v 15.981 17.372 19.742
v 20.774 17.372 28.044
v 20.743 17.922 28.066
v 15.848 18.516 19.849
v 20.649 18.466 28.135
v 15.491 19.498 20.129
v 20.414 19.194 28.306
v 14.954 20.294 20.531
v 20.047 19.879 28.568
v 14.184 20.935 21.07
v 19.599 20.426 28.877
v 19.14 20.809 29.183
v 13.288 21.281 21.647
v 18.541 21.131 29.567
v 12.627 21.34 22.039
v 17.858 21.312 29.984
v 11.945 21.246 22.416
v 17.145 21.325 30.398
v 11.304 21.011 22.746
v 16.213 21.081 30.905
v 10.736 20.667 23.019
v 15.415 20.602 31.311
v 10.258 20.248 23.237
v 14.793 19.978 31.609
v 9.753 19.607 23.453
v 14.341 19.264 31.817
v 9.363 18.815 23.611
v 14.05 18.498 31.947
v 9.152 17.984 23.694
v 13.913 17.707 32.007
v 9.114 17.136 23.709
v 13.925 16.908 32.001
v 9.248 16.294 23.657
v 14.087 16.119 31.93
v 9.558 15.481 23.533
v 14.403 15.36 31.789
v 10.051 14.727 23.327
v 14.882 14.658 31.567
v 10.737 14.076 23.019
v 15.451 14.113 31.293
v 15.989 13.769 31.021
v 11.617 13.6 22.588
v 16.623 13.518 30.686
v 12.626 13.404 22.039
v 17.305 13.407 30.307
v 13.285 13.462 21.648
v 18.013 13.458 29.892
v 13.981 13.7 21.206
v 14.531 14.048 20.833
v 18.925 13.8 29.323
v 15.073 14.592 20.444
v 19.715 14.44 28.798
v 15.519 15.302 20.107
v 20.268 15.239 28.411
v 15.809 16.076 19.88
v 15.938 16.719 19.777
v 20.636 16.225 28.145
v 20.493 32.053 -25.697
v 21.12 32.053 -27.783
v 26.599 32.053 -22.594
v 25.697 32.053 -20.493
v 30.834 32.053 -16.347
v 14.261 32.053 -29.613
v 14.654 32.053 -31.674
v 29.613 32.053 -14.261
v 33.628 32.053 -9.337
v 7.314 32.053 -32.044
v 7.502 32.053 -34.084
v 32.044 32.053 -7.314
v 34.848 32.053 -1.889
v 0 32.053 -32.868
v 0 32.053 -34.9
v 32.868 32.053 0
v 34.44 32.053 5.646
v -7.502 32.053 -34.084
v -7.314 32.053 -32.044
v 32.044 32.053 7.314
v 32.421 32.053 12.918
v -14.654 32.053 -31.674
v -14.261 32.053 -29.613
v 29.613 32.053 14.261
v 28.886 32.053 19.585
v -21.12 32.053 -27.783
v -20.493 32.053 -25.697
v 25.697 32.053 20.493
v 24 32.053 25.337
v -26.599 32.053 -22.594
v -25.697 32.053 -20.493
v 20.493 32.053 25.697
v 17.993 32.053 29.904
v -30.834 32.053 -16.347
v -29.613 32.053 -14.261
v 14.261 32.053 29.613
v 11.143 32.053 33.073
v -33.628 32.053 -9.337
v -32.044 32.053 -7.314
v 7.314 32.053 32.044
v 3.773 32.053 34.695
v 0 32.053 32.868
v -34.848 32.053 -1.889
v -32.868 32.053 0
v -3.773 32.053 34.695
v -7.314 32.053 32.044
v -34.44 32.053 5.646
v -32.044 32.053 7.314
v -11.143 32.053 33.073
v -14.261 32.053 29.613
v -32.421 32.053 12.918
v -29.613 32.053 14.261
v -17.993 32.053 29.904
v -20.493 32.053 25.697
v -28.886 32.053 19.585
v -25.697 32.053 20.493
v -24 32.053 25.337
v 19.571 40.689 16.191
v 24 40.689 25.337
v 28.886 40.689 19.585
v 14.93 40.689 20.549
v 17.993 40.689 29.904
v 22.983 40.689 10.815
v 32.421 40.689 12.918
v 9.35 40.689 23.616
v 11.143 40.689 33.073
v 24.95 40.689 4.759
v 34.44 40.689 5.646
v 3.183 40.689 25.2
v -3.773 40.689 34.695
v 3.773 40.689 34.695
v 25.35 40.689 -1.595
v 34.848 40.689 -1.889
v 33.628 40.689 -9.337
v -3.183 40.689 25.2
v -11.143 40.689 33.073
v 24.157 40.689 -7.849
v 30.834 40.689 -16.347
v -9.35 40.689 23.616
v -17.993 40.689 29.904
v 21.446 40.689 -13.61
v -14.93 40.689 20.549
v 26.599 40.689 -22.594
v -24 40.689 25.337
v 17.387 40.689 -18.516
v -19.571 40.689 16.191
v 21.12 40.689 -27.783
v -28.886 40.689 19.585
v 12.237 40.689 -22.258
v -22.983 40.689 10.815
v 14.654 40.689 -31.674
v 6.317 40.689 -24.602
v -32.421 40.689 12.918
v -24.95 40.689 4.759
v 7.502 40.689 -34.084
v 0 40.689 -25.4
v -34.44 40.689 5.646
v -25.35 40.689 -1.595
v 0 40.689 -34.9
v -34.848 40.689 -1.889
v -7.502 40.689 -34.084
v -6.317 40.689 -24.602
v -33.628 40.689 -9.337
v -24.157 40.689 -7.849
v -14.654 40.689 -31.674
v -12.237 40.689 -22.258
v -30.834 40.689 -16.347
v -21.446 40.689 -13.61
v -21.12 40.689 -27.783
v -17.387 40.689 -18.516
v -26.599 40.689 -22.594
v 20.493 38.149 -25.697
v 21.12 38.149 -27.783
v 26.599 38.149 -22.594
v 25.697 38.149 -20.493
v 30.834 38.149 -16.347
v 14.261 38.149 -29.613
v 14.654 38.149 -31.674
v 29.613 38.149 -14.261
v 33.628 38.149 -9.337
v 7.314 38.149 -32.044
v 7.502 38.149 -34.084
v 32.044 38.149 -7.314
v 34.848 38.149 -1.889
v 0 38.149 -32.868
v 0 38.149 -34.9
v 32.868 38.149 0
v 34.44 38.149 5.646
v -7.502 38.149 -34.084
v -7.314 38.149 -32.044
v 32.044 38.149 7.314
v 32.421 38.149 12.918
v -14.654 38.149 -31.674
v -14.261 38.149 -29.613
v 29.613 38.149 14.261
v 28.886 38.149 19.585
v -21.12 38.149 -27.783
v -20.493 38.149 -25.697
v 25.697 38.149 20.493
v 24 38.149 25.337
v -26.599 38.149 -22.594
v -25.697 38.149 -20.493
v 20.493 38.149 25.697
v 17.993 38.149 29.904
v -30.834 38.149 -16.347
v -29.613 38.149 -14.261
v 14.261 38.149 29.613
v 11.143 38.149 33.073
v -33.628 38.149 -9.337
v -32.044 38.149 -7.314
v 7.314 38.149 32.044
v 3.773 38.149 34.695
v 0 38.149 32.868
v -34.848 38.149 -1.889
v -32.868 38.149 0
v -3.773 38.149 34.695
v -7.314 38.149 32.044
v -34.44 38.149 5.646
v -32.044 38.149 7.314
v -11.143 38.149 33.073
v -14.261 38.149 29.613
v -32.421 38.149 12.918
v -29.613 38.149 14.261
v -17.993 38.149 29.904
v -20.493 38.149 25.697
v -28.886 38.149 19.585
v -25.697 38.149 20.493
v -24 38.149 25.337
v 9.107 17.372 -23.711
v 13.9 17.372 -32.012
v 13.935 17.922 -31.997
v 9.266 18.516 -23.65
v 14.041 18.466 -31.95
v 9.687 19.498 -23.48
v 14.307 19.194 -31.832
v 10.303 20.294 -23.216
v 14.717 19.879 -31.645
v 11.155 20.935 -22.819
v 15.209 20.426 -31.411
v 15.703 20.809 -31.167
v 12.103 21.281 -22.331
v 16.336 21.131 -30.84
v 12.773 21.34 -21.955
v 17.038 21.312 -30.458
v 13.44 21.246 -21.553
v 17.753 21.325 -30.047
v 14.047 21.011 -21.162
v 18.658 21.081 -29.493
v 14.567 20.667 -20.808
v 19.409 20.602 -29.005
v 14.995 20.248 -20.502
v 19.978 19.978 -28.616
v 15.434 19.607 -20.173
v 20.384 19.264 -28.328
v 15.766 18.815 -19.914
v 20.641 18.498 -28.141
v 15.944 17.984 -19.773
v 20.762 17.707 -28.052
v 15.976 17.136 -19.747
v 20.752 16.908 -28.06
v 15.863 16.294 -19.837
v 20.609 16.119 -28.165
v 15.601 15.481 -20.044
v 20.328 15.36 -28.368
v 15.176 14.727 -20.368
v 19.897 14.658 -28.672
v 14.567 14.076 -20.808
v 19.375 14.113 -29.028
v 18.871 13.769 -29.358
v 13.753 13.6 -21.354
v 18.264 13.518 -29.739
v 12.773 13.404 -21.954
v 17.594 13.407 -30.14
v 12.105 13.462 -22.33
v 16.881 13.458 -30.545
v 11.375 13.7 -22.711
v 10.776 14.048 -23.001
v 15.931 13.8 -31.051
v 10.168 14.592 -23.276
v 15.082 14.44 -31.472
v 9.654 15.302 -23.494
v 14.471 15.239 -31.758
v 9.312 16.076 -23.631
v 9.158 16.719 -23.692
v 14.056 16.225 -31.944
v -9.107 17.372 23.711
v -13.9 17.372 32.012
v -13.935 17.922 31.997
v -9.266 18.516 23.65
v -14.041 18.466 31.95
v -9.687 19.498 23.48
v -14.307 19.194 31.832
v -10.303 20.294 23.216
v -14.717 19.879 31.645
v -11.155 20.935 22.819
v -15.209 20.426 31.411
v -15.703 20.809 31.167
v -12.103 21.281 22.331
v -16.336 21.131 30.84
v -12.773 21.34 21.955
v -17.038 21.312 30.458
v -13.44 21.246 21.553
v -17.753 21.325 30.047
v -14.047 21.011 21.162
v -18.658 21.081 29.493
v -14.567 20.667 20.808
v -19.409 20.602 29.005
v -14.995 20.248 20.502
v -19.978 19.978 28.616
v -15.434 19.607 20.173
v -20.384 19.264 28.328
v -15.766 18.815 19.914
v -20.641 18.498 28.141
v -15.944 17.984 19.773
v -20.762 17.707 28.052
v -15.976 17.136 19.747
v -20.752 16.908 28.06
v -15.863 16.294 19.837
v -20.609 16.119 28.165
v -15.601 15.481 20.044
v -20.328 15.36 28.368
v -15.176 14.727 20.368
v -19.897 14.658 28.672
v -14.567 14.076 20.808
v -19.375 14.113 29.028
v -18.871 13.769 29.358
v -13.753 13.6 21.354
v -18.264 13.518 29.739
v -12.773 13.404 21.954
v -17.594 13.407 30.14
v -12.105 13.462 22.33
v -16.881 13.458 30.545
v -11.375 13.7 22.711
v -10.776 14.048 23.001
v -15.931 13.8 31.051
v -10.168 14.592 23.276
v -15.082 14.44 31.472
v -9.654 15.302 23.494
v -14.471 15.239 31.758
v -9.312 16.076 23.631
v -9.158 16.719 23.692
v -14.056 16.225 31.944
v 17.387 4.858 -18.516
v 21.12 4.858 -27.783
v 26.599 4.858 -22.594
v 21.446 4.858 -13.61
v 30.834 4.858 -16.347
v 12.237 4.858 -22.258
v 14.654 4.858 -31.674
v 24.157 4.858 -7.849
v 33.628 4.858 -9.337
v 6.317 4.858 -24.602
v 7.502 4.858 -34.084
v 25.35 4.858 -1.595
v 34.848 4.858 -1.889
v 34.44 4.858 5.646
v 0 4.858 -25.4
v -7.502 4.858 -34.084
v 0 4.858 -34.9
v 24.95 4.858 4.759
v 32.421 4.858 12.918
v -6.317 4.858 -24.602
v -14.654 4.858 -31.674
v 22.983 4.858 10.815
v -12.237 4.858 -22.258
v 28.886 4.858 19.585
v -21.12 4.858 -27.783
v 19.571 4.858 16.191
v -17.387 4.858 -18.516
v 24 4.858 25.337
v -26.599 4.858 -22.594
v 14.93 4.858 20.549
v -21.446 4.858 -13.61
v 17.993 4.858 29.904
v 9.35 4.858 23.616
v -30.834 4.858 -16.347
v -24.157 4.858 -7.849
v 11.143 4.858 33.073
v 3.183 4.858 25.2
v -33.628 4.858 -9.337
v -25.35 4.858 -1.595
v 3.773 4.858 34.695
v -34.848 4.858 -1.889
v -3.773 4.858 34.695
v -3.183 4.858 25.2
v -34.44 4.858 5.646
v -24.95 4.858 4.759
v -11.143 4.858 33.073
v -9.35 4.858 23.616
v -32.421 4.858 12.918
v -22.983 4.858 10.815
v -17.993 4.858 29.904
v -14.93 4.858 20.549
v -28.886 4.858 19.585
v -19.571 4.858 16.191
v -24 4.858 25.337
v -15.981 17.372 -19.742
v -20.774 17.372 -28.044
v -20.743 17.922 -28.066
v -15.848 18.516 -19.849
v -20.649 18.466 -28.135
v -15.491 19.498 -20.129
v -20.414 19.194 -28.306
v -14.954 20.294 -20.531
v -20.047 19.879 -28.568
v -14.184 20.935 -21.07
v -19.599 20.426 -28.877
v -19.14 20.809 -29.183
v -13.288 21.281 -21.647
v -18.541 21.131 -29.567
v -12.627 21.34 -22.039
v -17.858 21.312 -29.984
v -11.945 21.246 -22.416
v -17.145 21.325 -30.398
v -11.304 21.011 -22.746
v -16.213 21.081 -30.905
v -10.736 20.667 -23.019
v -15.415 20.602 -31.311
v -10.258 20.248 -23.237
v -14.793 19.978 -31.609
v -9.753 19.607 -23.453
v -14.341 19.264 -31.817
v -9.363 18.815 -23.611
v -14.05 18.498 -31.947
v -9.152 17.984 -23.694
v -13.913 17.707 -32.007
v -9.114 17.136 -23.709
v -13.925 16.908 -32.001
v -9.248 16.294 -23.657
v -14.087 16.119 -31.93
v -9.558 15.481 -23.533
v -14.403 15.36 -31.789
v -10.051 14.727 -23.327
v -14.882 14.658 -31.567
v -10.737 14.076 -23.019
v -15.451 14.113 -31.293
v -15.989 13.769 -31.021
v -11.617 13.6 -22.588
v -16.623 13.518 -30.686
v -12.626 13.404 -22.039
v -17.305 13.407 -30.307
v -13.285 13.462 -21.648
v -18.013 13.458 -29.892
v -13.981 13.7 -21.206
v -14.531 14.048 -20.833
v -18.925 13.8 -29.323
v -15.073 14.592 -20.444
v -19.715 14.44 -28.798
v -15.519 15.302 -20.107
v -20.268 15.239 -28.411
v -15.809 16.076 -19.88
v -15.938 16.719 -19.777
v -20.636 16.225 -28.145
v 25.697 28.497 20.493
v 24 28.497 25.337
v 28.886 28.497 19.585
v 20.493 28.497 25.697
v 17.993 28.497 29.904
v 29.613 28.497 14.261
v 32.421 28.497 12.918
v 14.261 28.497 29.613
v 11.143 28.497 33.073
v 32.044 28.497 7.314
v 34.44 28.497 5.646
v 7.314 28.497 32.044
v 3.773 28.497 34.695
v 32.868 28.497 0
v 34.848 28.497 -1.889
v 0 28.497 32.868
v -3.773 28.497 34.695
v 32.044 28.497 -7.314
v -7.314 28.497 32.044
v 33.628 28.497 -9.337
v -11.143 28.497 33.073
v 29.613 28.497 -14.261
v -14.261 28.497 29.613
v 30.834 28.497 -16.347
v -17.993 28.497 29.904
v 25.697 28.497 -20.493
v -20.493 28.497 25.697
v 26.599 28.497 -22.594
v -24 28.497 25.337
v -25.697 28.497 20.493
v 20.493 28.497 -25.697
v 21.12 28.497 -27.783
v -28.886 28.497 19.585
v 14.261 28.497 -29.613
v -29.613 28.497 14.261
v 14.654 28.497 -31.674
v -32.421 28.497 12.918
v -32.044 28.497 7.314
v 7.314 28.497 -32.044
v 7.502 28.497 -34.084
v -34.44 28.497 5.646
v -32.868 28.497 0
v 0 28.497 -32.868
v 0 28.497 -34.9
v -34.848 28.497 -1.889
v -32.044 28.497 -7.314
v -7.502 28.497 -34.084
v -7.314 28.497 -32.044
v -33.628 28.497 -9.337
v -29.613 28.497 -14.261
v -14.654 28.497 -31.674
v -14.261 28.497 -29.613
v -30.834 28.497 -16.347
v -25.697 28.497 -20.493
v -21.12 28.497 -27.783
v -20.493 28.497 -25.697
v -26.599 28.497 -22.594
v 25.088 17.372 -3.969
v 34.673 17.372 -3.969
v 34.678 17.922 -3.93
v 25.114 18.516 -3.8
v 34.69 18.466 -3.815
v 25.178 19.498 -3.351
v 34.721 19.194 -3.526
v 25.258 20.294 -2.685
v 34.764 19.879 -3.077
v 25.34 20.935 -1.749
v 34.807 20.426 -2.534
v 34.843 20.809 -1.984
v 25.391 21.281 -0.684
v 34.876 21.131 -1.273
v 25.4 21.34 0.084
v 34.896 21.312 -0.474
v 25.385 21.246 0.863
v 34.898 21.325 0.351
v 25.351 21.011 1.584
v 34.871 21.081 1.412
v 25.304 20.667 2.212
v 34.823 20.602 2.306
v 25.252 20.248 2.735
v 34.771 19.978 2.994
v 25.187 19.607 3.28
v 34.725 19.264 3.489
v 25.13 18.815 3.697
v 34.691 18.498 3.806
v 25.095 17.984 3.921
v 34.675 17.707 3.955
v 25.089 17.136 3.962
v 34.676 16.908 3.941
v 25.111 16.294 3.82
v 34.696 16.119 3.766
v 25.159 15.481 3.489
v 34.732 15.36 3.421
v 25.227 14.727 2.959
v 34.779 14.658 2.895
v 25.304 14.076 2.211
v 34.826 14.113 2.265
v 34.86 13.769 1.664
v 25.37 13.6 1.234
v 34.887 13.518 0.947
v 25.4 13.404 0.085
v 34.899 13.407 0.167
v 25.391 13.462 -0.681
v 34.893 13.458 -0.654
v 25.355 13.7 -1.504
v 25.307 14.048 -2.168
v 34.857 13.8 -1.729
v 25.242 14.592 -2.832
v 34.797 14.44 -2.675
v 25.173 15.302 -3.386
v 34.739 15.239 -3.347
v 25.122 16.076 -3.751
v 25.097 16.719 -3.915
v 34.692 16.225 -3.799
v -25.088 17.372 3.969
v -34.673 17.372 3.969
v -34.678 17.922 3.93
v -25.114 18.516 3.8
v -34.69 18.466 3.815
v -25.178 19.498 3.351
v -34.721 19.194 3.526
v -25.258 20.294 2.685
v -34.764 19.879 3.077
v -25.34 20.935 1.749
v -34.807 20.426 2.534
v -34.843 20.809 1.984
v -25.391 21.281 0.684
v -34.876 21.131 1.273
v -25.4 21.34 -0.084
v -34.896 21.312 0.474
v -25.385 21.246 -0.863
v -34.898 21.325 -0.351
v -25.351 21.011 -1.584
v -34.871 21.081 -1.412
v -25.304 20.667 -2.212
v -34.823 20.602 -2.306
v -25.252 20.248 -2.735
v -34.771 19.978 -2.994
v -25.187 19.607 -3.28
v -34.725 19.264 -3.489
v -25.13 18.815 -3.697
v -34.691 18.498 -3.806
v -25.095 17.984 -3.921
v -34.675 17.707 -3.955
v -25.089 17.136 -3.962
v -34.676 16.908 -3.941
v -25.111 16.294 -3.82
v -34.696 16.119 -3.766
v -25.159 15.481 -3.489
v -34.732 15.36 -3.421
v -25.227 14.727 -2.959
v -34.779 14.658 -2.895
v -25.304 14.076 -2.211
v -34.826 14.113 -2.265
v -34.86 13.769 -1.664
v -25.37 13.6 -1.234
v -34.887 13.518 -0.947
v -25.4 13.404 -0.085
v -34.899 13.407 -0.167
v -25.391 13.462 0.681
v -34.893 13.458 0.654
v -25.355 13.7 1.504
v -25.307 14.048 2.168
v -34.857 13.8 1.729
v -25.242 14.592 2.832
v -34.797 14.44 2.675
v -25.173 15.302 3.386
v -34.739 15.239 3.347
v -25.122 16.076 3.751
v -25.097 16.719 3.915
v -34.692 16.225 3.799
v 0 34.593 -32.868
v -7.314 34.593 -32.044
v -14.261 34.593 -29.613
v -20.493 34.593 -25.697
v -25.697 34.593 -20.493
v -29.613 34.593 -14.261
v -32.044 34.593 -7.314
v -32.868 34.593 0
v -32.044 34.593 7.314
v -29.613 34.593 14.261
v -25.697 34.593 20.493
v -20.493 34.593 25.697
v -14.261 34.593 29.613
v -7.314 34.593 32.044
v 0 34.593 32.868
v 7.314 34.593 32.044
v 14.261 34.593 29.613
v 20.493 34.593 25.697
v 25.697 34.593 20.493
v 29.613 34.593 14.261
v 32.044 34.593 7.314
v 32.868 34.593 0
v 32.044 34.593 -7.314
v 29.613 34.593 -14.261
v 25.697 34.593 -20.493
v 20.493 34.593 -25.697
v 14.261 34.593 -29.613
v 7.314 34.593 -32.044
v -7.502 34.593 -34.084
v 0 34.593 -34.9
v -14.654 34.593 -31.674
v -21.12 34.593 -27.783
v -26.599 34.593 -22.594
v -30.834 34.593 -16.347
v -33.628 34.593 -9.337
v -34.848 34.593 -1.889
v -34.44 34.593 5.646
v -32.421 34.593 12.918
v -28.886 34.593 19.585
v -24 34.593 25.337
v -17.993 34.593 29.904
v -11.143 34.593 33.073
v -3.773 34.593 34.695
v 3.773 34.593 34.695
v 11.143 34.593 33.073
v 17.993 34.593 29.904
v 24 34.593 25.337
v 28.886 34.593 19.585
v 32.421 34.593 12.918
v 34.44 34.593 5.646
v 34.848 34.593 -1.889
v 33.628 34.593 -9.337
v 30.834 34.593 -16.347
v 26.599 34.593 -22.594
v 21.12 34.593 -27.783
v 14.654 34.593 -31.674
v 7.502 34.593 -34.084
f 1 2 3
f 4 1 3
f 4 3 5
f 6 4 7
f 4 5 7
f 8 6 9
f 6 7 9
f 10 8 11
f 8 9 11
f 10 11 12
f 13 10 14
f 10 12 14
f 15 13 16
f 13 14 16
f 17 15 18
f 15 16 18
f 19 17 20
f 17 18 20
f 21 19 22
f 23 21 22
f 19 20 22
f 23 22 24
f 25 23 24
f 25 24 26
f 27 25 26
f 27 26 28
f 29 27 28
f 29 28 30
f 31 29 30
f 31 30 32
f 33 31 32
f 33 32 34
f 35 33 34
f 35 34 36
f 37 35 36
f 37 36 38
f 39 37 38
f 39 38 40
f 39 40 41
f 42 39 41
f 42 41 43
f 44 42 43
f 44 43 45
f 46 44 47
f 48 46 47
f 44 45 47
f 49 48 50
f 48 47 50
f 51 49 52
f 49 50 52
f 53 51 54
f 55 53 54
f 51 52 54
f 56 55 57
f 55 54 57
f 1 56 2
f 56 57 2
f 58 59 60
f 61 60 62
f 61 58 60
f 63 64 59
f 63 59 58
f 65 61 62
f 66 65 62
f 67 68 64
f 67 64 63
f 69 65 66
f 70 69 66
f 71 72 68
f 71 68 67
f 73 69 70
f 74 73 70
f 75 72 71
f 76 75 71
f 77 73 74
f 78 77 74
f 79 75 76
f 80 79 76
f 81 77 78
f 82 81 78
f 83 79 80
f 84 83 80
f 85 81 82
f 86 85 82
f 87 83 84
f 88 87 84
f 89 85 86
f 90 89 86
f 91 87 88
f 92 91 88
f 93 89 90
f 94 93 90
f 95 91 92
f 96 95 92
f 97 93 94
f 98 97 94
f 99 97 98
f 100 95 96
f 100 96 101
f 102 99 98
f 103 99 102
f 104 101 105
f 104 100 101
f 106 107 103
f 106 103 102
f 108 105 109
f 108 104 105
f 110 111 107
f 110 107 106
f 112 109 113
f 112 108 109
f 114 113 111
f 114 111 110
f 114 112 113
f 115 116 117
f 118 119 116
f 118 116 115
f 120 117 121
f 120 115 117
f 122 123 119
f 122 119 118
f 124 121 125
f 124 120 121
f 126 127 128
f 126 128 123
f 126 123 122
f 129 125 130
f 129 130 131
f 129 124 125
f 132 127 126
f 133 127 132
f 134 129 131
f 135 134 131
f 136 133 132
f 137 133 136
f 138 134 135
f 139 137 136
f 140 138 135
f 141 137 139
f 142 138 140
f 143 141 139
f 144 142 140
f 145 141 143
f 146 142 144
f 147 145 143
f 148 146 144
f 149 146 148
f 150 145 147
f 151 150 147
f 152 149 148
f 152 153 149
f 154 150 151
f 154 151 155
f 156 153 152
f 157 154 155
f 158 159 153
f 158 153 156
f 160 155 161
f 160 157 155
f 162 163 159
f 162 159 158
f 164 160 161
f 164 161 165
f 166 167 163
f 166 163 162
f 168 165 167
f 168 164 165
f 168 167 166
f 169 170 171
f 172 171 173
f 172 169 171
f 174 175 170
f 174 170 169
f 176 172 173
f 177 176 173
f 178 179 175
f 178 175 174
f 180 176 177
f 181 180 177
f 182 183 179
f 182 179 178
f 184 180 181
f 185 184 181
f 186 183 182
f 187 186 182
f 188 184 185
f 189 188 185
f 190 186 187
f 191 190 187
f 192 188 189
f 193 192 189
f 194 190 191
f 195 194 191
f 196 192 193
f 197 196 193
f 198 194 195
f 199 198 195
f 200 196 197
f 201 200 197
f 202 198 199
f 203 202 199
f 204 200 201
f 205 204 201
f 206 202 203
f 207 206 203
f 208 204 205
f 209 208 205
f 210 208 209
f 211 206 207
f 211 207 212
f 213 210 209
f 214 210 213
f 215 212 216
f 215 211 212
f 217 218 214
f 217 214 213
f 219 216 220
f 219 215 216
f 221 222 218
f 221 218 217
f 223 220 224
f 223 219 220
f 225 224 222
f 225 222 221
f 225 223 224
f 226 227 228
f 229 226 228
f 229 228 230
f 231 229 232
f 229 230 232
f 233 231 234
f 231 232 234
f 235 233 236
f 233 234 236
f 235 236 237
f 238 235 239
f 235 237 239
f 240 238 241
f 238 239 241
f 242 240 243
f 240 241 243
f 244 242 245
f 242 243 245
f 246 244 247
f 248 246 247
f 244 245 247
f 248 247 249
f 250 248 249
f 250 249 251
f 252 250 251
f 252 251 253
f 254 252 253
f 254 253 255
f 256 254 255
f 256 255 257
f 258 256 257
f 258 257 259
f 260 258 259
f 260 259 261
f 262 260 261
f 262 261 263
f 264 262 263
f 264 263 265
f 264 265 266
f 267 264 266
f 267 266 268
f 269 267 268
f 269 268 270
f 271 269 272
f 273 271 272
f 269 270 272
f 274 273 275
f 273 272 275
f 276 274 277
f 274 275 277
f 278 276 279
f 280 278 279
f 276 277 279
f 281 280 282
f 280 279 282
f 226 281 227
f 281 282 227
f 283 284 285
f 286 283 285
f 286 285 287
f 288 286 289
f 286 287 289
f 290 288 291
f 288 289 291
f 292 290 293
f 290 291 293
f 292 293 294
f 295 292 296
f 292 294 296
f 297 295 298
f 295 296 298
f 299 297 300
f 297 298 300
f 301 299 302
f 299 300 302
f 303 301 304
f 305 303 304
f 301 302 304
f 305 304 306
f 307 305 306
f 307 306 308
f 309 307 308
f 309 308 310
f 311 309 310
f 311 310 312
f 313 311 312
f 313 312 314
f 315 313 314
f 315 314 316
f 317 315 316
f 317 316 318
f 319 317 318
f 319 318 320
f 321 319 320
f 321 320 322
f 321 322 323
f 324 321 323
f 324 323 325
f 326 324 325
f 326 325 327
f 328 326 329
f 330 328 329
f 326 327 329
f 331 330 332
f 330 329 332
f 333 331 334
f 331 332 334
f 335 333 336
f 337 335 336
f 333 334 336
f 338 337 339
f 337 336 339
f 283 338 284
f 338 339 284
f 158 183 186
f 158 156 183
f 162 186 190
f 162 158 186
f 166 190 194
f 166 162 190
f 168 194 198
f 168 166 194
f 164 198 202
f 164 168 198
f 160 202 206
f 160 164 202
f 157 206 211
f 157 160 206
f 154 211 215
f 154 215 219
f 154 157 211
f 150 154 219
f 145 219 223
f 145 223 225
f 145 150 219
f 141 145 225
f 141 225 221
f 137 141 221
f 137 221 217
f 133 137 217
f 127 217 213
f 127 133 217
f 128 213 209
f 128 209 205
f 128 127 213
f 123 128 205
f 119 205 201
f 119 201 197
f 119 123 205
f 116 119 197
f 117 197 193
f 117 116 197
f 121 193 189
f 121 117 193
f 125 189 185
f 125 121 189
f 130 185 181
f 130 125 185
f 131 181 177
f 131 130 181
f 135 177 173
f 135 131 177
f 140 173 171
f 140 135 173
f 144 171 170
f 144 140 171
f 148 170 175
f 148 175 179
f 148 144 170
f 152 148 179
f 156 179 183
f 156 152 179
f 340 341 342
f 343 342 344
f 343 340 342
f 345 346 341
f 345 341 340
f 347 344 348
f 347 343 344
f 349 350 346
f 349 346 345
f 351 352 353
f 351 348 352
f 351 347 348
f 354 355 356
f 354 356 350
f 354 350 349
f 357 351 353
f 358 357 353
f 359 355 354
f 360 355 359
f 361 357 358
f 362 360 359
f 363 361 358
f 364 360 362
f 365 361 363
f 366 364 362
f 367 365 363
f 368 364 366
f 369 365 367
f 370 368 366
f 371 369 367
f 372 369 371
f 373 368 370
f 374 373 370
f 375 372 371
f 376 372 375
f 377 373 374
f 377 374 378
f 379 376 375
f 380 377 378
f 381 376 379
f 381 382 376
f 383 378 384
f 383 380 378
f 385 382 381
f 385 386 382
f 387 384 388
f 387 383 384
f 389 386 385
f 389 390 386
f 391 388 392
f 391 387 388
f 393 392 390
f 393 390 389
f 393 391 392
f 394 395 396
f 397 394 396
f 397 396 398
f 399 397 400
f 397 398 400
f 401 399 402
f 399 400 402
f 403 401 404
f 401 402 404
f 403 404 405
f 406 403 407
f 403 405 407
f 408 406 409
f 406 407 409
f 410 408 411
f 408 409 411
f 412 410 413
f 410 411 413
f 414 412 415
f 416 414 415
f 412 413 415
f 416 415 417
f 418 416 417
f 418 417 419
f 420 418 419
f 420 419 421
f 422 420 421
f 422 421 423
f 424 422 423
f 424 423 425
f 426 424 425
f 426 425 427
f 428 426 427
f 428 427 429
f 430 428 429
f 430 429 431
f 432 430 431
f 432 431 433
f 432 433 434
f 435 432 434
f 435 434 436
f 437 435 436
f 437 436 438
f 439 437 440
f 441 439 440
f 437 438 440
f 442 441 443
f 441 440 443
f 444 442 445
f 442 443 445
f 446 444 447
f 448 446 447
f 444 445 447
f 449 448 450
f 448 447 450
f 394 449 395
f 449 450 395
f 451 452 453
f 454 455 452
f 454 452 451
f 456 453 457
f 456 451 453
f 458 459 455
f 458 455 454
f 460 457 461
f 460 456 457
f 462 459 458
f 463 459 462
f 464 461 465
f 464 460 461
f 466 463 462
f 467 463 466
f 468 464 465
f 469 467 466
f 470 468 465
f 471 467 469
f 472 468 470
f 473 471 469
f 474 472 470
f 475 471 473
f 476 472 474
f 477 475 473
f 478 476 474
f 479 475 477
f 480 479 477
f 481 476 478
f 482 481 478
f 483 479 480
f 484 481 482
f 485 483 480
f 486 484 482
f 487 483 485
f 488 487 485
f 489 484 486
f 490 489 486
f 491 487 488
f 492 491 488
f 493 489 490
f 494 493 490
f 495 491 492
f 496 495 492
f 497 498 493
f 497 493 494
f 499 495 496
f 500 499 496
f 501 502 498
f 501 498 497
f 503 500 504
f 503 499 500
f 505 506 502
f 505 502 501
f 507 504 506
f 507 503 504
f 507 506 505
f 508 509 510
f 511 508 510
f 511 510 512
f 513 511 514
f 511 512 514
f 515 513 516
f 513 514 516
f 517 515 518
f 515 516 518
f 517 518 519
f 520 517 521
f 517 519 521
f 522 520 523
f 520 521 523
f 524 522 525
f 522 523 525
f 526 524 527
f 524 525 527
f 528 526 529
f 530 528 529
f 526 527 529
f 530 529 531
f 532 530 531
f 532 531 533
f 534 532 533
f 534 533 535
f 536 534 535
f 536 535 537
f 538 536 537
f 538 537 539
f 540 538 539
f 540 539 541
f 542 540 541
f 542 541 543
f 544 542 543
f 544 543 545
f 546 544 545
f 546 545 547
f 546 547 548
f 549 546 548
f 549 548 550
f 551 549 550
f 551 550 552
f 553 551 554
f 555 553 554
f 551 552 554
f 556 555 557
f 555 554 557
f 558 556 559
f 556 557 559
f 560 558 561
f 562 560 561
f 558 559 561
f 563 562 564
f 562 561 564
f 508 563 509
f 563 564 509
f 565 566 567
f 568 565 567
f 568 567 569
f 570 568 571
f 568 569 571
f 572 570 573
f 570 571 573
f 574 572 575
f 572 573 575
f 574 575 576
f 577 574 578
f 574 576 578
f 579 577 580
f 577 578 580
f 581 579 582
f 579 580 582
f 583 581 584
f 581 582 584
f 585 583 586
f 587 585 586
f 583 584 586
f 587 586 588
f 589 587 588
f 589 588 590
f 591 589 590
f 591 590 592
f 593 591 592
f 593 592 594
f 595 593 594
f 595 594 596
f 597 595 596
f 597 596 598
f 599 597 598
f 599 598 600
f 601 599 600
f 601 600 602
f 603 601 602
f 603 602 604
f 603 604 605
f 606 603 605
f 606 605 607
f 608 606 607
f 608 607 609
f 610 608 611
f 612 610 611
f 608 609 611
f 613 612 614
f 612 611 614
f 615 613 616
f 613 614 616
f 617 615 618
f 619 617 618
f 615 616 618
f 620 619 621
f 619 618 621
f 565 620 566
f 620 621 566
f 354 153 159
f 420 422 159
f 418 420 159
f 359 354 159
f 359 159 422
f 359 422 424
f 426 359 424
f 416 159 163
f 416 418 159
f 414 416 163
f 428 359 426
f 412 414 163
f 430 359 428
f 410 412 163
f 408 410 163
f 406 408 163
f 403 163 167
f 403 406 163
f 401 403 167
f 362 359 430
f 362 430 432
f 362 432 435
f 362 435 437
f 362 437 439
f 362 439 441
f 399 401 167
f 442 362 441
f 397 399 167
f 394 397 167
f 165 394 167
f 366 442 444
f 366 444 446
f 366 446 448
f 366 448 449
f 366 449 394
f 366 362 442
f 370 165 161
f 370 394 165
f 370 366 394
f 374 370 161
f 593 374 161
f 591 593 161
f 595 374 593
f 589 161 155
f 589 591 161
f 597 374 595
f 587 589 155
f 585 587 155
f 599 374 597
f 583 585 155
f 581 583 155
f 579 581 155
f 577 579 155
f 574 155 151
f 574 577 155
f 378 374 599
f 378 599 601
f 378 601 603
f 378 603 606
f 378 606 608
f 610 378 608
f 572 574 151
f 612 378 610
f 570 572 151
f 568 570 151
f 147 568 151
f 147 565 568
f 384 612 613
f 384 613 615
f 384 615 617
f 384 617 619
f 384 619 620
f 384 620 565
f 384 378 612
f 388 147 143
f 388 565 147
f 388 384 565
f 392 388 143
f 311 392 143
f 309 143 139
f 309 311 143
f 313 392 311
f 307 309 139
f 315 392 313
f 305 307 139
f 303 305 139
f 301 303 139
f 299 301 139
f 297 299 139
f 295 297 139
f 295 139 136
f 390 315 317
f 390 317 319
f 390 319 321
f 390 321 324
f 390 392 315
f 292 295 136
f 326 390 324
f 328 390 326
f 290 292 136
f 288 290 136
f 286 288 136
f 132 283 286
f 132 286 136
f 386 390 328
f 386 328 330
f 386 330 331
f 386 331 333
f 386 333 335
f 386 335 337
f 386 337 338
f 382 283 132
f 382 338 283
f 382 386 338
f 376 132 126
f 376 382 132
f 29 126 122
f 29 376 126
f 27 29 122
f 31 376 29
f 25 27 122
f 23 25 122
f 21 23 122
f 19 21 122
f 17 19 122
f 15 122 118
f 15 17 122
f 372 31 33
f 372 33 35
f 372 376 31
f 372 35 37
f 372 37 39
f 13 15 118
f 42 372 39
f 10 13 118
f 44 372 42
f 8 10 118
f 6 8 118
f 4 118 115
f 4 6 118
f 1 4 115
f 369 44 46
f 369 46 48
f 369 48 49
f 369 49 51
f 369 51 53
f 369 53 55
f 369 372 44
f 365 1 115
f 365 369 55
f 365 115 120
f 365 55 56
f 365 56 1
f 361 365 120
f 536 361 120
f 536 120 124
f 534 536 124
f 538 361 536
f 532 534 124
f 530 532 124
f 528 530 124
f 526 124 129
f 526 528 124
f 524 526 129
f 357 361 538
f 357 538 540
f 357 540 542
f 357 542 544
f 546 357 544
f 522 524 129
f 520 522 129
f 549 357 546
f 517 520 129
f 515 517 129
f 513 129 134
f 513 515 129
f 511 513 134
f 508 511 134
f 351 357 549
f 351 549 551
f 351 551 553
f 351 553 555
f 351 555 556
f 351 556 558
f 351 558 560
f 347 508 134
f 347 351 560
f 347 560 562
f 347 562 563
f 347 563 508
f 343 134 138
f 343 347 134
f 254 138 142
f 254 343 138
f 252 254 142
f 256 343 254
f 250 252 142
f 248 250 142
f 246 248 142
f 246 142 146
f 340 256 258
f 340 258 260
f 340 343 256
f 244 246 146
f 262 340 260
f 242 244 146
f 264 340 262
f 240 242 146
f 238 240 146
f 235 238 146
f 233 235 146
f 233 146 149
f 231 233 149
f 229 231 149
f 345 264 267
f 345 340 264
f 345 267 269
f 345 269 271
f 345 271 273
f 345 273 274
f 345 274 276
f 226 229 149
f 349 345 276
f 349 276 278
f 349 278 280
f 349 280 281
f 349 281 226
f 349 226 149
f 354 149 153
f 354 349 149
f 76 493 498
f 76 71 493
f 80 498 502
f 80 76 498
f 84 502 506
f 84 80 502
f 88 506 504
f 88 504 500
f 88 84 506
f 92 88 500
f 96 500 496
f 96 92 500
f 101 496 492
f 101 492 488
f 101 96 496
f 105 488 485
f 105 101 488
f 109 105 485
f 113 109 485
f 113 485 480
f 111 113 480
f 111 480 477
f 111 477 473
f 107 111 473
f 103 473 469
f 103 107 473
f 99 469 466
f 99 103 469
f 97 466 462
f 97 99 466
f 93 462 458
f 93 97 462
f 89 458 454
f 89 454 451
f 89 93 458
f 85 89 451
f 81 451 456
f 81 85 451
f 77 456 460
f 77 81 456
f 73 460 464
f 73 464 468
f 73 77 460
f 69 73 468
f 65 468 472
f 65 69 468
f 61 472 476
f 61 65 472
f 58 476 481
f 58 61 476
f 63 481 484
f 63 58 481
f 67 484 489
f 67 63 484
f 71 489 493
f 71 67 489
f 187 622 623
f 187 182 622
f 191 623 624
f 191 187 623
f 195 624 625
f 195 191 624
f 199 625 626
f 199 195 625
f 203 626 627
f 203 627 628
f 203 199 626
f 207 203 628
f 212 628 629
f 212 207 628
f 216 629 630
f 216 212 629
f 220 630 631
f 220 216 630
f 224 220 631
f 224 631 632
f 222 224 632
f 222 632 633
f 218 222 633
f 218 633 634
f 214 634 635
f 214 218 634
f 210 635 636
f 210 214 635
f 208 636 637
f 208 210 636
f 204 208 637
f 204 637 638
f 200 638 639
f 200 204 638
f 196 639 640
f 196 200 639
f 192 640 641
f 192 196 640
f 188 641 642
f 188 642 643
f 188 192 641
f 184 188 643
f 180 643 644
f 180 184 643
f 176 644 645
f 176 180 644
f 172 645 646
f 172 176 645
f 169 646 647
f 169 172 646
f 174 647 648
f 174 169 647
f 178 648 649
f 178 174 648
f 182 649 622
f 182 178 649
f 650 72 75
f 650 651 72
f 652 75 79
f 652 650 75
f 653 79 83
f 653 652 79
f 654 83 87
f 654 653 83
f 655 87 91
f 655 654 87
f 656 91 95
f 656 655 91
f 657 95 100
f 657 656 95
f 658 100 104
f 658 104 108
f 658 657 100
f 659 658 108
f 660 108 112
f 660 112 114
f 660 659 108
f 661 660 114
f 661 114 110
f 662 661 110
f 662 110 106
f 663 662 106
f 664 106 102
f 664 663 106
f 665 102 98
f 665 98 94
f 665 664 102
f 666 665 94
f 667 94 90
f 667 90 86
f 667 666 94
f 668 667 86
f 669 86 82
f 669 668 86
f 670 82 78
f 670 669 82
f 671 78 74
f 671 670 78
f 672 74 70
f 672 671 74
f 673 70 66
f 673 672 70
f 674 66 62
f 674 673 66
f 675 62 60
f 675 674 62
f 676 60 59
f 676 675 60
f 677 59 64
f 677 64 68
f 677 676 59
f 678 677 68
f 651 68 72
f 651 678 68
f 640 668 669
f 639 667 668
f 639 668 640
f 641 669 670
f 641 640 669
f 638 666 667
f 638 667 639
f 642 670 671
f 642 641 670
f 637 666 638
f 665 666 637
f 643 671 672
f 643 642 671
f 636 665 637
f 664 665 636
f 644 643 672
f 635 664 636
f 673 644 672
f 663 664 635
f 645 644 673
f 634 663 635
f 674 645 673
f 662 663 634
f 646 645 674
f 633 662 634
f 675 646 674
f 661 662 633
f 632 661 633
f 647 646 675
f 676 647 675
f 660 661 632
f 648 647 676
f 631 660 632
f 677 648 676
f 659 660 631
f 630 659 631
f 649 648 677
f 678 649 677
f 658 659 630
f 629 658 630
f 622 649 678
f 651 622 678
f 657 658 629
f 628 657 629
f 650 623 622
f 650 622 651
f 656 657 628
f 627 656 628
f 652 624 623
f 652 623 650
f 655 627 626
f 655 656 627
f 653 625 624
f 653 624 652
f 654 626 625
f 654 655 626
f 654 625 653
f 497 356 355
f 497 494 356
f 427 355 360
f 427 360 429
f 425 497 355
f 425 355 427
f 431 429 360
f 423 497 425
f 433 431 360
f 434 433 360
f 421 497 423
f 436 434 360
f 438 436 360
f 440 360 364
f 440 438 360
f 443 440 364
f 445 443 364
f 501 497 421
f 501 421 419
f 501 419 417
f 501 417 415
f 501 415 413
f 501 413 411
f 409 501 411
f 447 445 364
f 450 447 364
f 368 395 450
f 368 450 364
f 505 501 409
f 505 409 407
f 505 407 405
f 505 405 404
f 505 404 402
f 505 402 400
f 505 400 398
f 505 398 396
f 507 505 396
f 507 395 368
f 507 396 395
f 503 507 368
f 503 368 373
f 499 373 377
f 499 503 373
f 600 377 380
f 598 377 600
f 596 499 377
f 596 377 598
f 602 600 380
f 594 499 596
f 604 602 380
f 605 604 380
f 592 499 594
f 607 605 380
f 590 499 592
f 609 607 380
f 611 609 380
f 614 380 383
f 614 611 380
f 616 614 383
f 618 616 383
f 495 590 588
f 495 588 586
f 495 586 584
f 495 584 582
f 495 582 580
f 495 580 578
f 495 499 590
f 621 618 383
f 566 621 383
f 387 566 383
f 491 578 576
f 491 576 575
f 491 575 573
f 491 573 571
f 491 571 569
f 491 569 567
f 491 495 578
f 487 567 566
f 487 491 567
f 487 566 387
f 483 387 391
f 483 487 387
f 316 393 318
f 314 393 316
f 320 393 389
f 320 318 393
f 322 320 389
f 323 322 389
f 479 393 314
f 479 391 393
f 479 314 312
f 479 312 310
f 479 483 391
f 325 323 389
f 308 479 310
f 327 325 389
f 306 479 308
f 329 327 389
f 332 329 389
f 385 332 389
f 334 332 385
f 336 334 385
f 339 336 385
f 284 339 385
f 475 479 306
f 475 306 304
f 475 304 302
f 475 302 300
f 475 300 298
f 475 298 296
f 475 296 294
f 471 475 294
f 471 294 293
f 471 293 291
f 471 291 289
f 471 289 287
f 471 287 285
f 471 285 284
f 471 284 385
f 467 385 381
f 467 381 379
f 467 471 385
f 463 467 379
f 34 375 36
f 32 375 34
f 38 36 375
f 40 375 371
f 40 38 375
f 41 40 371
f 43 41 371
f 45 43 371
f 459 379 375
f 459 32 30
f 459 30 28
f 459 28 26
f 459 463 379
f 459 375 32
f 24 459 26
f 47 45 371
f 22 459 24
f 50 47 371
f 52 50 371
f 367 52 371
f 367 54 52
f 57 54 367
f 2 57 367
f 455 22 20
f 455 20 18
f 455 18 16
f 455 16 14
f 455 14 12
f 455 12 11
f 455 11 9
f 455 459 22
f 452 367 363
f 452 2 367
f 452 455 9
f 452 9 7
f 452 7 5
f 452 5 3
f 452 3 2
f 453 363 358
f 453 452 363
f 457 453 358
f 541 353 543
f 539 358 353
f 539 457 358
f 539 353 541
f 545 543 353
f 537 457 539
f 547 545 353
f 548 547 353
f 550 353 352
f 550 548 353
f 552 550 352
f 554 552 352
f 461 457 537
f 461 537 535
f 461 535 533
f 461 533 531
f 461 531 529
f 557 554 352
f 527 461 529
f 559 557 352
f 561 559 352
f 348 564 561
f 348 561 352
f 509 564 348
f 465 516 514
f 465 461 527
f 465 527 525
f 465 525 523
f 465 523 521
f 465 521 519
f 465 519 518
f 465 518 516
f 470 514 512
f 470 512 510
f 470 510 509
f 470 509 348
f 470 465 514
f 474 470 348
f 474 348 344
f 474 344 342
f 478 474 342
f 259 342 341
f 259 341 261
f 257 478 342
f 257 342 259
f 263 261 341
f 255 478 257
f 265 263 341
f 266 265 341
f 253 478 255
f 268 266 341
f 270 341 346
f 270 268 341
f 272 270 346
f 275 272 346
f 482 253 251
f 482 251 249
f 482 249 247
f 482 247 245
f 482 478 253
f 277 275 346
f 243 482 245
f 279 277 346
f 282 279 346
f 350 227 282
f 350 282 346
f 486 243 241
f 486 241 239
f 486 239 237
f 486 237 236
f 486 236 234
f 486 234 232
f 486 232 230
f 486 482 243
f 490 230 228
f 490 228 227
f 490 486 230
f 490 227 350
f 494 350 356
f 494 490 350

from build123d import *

# Parameters (mm, degrees)
F_3_8_16_TAPPED_HOLE2_REACH  = 90.009
F_3_8_16_TAPPED_HOLE2_BORE_R = 3.96875
CIRPATTERN1_COUNT            = 6


with BuildPart() as part:
    # Sketch2 → Revolve1 (revolve)
    with BuildSketch(Plane.XY, mode=Mode.PRIVATE) as revolve1_sk:
        Polygon((-34.8996, 40.689305596), (-25.4, 40.689305596), (-25.4, 4.857627196), (-34.8996, 4.857627196), (-34.8996, 28.497305596), (-32.8676, 28.497305596), (-32.8676, 32.053305596), (-34.8996, 32.053305596), (-34.8996, 34.593305596), (-32.8676, 34.593305596), (-32.8676, 38.149305596), (-34.8996, 38.149305596), align=None)
    revolve(revolve1_sk.sketch.rotate(Axis((0, 0, 0), (0, 1, 0)), 270), axis=Axis((0, 0, 0), (0, 1, 0)))

    # 3/8-16 Tapped Hole2 bore → 3/8-16 Tapped Hole2 (cut, up to next)
    with BuildSketch(Plane(origin=(34.8996, 0, 0), x_dir=(0, 0, -1), z_dir=(1, 0, 0)), mode=Mode.PRIVATE) as f_3_8_16_tapped_hole2_sk1:
        with Locations((0, 17.372080196)):
            Circle(F_3_8_16_TAPPED_HOLE2_BORE_R)
    f_3_8_16_tapped_hole2_tool1 = extrude(f_3_8_16_tapped_hole2_sk1.sketch, amount=-F_3_8_16_TAPPED_HOLE2_REACH, mode=Mode.PRIVATE) & part.part
    f_3_8_16_tapped_hole2 = f_3_8_16_tapped_hole2_tool1.solids().sort_by_distance((34.8996, 17.37208, 0))[0]
    add(f_3_8_16_tapped_hole2, mode=Mode.SUBTRACT)

    # CirPattern1: 3/8-16 Tapped Hole2 ×6 about axis
    cirpattern1_axis = Axis((0, 40.689305596, 0), (0, -1, 0))
    for i in range(1, CIRPATTERN1_COUNT):
        add(f_3_8_16_tapped_hole2.rotate(cirpattern1_axis, i * 360 / CIRPATTERN1_COUNT), mode=Mode.SUBTRACT)


solid = part.part
